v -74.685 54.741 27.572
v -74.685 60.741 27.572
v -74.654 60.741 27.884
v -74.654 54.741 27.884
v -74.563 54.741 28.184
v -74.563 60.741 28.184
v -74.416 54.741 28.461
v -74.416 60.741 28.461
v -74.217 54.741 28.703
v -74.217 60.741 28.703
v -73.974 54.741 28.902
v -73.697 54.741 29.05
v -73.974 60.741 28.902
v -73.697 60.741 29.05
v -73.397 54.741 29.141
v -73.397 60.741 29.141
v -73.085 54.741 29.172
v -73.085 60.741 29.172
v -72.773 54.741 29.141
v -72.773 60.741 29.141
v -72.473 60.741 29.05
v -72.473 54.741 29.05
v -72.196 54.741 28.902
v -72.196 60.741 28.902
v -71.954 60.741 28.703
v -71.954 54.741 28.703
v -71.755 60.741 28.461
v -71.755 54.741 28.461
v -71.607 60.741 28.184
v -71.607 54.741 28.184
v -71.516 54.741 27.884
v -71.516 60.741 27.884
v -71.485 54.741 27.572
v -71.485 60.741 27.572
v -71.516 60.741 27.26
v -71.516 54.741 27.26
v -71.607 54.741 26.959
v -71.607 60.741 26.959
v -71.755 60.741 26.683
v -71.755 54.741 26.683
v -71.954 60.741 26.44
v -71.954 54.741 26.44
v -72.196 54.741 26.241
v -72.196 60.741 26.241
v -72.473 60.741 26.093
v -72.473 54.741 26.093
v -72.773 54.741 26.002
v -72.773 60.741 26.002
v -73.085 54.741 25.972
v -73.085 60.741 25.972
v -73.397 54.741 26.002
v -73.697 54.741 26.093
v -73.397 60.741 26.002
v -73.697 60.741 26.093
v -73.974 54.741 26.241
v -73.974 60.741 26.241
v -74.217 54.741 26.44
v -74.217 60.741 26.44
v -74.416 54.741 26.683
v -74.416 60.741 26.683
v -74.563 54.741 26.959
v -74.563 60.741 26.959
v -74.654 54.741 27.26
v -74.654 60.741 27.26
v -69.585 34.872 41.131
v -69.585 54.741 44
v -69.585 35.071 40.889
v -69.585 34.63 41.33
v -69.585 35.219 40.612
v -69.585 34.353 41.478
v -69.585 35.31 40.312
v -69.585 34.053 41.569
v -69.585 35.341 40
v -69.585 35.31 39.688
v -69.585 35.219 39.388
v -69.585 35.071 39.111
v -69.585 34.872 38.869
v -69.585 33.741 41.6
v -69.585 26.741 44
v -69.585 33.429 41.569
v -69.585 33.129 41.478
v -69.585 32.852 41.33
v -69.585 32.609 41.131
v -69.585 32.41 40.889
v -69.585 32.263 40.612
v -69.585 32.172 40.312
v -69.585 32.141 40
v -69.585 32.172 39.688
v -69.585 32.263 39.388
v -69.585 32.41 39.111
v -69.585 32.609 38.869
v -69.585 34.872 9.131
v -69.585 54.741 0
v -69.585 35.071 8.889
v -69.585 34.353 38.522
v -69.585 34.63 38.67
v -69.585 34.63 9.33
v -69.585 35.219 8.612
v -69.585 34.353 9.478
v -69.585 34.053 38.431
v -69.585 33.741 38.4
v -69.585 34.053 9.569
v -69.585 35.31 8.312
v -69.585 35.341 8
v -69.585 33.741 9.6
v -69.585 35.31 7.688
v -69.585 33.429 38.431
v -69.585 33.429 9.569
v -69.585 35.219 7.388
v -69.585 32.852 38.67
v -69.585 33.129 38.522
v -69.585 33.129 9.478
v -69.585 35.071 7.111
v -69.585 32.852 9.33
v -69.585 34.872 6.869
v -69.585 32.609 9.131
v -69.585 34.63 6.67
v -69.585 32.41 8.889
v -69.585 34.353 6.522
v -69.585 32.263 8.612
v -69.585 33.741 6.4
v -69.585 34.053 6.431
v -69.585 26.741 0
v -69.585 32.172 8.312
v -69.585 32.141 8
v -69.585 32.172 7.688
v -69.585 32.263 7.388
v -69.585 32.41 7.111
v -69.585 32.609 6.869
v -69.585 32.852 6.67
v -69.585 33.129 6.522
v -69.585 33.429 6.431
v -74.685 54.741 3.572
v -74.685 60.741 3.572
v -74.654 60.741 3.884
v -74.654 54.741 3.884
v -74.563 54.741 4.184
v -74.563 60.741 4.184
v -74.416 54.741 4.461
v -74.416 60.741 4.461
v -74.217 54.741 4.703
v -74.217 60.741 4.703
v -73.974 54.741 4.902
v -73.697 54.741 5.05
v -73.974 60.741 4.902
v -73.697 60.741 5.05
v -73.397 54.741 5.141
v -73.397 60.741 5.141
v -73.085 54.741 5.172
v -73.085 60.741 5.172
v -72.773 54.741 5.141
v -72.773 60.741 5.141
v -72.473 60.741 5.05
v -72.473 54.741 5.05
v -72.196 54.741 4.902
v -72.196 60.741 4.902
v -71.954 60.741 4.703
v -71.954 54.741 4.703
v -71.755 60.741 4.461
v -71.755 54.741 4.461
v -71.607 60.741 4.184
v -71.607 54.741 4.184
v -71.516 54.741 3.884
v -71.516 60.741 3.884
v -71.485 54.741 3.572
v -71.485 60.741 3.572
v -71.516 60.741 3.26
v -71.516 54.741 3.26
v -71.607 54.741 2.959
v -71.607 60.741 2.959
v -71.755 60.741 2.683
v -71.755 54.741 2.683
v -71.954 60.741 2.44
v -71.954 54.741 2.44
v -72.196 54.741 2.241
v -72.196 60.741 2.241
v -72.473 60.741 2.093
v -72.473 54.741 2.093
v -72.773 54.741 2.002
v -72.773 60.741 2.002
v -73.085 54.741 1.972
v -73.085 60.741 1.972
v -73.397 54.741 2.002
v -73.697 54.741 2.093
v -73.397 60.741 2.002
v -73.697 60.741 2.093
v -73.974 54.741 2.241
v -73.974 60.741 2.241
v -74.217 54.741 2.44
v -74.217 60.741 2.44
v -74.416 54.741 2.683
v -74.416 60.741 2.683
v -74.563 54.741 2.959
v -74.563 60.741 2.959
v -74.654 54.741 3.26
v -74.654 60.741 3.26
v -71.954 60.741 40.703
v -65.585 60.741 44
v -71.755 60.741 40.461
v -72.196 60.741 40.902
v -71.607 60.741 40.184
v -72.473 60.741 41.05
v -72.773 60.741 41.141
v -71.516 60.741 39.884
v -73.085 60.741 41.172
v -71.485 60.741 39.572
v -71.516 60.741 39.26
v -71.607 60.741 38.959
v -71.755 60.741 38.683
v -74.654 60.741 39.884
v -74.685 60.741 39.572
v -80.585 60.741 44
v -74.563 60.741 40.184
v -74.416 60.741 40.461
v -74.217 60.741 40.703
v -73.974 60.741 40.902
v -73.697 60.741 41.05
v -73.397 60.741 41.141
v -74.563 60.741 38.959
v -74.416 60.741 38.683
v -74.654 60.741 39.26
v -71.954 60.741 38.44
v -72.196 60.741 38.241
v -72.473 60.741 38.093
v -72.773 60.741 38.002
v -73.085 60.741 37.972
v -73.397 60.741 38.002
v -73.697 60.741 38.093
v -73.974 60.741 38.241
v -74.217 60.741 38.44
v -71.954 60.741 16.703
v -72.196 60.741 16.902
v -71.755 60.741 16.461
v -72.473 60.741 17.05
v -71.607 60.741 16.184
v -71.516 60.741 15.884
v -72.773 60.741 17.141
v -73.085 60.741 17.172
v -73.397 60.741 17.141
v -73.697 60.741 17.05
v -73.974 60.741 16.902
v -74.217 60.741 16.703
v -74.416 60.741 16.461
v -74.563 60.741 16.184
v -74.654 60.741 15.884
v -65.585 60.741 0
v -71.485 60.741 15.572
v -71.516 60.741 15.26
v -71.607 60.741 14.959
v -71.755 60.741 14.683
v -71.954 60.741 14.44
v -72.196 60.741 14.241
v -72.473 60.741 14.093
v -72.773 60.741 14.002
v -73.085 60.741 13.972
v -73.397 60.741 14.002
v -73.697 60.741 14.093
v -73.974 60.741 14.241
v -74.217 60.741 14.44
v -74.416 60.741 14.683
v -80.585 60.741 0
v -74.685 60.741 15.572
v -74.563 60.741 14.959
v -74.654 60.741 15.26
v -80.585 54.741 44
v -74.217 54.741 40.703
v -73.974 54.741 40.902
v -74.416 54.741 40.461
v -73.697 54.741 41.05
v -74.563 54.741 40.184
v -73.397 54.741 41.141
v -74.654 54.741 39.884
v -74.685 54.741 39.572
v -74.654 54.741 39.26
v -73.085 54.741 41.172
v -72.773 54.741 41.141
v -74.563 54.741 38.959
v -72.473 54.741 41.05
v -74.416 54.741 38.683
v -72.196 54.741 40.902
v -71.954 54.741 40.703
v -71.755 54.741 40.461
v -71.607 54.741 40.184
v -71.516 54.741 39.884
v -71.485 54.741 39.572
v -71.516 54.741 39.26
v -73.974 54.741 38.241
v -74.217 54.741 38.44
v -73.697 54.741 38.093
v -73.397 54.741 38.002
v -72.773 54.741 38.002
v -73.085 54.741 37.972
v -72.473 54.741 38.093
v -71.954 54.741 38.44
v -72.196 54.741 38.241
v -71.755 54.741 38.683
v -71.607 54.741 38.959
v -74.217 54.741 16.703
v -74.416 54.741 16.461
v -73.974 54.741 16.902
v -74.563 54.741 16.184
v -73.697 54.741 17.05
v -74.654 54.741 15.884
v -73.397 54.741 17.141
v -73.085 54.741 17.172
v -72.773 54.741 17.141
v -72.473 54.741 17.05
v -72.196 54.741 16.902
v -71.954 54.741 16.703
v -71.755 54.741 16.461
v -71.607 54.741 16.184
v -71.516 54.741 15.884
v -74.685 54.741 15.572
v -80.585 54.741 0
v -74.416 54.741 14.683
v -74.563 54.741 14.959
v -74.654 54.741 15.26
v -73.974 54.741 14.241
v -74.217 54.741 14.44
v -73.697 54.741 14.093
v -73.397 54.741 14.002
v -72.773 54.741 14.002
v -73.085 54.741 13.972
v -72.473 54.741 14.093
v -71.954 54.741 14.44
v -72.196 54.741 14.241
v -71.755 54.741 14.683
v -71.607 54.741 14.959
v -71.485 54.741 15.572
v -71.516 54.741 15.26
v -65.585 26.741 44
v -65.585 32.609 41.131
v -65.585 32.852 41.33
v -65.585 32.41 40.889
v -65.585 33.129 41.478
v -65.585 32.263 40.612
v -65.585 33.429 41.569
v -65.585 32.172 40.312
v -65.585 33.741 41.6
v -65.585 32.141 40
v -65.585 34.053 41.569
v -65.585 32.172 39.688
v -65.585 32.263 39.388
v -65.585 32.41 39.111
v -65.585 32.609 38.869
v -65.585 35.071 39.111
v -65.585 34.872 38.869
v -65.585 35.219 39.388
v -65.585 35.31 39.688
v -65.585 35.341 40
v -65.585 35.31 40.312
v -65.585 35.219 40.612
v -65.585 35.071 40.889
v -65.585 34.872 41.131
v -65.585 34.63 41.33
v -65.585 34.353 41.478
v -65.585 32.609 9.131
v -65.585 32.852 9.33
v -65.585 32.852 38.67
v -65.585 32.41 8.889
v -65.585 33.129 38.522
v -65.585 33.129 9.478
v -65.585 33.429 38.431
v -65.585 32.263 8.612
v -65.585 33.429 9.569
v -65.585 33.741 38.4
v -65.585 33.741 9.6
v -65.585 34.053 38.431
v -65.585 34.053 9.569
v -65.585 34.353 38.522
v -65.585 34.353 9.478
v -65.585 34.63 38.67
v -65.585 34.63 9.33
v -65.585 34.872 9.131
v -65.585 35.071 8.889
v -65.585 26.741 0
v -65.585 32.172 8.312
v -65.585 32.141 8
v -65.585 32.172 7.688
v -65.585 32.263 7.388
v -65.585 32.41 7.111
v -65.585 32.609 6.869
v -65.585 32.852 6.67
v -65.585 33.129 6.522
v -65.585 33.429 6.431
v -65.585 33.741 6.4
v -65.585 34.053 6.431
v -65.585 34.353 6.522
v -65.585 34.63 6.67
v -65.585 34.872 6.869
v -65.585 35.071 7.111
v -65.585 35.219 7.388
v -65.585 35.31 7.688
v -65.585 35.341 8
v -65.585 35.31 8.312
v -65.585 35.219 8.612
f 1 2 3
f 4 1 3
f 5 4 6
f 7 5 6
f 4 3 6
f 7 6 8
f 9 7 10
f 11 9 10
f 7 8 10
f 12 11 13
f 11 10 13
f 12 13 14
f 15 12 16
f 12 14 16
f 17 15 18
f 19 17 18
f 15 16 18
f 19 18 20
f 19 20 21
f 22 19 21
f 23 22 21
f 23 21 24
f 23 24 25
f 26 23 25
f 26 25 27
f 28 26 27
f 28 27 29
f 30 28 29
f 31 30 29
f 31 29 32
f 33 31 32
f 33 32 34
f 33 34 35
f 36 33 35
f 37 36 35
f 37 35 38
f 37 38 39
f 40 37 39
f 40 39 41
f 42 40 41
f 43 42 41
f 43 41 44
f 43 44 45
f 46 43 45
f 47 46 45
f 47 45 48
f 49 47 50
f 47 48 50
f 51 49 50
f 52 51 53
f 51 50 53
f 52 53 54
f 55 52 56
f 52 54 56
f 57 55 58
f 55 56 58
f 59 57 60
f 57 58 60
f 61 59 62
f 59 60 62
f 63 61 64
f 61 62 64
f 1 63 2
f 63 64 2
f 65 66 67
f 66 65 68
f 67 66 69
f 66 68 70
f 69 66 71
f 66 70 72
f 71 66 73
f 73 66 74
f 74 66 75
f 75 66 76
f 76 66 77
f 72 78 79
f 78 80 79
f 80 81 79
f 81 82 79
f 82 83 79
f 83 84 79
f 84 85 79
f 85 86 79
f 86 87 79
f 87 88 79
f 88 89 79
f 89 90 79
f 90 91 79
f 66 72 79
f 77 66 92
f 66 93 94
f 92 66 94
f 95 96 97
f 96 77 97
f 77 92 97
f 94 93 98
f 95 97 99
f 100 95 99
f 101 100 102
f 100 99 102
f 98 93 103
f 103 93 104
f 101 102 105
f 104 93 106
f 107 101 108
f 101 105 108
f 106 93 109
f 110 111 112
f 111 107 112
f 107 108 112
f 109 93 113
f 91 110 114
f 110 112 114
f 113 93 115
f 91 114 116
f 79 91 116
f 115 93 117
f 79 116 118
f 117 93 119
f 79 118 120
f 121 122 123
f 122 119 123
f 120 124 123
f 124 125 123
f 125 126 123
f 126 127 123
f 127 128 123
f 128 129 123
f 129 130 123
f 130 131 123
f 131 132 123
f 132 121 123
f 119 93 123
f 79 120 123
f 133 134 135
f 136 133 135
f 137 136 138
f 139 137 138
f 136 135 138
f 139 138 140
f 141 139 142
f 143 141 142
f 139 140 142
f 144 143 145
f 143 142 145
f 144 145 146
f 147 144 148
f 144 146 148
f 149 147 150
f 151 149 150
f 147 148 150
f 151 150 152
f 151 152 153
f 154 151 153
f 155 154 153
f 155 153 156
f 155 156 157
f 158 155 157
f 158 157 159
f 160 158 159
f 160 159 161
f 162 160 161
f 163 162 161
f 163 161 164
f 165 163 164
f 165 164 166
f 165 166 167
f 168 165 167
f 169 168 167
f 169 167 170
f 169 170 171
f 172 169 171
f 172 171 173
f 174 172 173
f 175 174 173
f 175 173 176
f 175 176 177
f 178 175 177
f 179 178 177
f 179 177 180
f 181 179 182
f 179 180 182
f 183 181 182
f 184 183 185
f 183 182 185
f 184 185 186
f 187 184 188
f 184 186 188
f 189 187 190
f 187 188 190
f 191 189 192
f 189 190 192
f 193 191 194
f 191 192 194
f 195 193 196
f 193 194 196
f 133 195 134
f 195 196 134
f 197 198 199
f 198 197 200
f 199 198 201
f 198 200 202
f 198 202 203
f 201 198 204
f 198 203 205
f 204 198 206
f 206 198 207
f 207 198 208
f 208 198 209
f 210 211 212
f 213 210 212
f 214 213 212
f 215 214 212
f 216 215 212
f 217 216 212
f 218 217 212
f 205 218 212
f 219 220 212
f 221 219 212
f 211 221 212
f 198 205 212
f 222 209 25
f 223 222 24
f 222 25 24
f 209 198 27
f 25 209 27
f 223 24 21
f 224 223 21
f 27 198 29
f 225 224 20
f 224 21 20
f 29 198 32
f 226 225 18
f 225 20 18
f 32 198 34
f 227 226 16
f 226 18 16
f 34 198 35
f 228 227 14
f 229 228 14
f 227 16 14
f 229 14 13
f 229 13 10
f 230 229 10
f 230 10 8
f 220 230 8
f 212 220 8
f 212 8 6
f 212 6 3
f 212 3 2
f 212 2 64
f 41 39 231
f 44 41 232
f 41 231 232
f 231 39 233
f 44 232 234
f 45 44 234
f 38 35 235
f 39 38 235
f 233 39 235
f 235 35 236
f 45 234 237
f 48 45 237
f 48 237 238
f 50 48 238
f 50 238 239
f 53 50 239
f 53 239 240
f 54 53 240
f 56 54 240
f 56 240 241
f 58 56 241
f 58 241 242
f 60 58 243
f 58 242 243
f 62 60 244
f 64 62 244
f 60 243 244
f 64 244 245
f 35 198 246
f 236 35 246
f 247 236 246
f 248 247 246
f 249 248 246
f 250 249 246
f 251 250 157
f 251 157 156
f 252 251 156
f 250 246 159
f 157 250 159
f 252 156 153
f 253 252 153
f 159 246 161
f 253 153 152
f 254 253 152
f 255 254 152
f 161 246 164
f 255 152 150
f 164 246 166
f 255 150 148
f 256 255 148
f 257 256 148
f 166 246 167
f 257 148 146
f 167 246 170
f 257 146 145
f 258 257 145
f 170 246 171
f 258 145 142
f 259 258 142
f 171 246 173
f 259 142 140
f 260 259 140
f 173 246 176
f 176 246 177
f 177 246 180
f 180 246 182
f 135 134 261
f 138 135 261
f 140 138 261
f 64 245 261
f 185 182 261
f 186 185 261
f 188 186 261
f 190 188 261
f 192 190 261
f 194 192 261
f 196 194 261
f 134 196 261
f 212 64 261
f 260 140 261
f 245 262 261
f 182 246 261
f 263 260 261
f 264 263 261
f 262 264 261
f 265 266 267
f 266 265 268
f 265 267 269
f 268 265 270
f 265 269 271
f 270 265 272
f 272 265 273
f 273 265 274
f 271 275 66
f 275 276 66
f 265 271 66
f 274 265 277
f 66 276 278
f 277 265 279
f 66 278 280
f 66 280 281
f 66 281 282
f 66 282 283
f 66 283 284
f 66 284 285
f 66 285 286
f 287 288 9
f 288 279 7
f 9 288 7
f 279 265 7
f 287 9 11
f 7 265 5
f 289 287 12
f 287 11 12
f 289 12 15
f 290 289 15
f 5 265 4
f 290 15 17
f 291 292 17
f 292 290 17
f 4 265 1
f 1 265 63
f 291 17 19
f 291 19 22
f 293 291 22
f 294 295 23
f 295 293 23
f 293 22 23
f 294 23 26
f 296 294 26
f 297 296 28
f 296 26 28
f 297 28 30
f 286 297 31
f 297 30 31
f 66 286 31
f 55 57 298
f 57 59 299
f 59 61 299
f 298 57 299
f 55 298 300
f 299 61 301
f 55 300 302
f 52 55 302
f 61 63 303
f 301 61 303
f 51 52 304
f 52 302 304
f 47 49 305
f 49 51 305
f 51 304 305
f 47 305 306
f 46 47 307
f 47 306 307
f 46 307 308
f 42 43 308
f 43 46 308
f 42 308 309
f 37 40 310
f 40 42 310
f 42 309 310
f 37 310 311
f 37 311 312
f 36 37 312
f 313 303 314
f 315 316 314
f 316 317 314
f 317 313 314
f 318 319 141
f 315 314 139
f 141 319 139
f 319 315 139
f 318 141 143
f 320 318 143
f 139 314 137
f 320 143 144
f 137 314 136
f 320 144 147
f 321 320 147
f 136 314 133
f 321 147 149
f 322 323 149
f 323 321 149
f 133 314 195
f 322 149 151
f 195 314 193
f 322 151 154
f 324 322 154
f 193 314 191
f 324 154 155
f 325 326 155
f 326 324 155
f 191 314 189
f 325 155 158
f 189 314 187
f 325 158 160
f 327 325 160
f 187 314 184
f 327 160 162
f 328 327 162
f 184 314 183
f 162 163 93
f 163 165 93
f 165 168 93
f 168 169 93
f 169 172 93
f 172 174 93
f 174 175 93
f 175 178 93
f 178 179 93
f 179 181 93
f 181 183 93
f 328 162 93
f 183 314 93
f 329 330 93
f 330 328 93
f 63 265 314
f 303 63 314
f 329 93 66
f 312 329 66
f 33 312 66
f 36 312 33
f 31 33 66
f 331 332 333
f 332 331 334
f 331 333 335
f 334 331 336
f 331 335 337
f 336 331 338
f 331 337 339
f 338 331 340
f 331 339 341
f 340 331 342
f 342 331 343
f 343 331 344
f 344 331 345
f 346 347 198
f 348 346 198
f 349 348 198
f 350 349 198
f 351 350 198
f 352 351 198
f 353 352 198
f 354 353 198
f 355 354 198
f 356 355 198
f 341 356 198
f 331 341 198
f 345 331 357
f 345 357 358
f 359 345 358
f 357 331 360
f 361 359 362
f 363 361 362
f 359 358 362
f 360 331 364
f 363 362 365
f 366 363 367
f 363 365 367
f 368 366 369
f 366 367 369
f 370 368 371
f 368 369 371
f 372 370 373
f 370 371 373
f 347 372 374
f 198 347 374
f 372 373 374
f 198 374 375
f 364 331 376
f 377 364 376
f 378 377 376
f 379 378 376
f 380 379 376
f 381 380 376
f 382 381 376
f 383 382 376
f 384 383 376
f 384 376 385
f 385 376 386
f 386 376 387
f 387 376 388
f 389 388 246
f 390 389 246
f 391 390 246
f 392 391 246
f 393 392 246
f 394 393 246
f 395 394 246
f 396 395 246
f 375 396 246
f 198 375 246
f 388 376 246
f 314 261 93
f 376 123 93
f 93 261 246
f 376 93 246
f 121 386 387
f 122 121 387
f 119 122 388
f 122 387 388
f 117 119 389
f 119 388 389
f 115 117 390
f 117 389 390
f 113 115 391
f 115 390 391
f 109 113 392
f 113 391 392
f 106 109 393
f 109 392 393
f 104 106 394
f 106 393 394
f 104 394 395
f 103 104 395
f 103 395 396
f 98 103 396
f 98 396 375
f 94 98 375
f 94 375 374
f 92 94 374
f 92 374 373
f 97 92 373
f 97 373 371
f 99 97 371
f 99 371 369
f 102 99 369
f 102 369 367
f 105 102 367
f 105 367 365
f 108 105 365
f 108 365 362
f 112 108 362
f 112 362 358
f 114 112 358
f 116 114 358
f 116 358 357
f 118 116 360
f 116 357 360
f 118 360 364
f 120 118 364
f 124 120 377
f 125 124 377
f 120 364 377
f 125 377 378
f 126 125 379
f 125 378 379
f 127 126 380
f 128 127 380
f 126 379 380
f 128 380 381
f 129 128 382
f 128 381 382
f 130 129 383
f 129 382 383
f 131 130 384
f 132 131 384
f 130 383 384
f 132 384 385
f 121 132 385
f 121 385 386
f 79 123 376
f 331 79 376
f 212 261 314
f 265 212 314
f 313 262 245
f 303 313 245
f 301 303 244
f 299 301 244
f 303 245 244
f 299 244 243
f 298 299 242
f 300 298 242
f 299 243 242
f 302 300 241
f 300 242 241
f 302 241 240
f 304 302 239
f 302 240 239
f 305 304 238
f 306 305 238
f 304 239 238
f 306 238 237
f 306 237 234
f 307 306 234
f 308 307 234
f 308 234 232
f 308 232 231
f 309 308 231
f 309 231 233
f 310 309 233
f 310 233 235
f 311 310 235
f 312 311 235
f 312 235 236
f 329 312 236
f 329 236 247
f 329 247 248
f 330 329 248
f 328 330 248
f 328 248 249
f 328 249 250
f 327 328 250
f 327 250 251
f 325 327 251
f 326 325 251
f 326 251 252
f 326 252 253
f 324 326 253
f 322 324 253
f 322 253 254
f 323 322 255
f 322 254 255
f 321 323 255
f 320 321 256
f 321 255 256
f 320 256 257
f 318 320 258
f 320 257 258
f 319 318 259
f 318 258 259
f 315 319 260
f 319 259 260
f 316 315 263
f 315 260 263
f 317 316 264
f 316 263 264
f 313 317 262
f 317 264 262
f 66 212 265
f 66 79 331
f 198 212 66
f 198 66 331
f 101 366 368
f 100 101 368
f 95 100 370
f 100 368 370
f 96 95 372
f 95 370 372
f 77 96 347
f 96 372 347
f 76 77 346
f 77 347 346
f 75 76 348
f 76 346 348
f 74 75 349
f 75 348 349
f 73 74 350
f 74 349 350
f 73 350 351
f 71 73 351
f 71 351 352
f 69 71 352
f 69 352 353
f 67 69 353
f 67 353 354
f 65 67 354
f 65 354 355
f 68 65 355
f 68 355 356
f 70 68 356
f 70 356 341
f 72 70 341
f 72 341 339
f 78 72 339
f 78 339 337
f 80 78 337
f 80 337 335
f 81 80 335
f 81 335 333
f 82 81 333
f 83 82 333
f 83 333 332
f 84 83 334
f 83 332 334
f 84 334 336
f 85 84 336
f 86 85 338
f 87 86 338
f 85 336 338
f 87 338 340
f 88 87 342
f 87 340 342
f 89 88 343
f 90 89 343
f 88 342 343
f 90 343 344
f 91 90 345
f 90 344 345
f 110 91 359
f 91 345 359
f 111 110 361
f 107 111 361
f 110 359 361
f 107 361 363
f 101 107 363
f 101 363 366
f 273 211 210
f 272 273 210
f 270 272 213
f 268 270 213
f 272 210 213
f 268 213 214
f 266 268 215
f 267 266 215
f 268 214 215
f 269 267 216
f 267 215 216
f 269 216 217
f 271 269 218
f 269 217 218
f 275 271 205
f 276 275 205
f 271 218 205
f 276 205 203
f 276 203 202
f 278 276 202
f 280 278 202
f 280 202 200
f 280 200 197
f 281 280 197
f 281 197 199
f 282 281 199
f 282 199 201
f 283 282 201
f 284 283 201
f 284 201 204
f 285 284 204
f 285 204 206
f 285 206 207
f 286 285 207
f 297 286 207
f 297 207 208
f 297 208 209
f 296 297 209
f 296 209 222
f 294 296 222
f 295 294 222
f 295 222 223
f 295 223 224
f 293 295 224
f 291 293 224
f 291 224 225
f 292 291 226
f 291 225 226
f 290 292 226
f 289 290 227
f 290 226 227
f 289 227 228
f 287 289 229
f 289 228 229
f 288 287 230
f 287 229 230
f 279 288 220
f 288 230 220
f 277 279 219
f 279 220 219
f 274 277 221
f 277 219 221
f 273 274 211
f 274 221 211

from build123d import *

# Parameters (mm, degrees)
BOSS_EXTRUDE1_DEPTH = 44
SKETCH3_R           = 1.6
CUT_EXTRUDE2_DEPTH  = 10
SKETCH2_R           = 1.6
CUT_EXTRUDE3_DEPTH  = 10


with BuildPart() as part:
    # Sketch1 → Boss-Extrude1 (new body)
    with BuildSketch(Plane.XY):
        Polygon((-80.585156419, 60.740798274), (-80.585156419, 54.740798274), (-69.585156419, 54.740798274), (-69.585156419, 26.740798274), (-65.585156419, 26.740798274), (-65.585156419, 60.740798274), align=None)
    extrude(amount=BOSS_EXTRUDE1_DEPTH)

    # Sketch3 → Cut-Extrude2 (cut)
    with BuildSketch(Plane(origin=(-65.585156419, 0, 0), x_dir=(0, 0, -1), z_dir=(1, 0, 0))):
        with Locations((-40, 33.740798274)):
            Circle(SKETCH3_R)
        with Locations((-8, 33.740798274)):
            Circle(SKETCH3_R)
    extrude(amount=-CUT_EXTRUDE2_DEPTH, mode=Mode.SUBTRACT)

    # Sketch2 → Cut-Extrude3 (cut)
    with BuildSketch(Plane(origin=(0, 60.740798274, 0), x_dir=(1, 0, 0), z_dir=(0, 1, 0))):
        with Locations(Location((-73.085156419, -3.571673595, 0), (0, 0, 180))):
            Circle(SKETCH2_R)
        with Locations(Location((-73.085156419, -15.571673595, 0), (0, 0, 180))):
            Circle(SKETCH2_R)
        with Locations(Location((-73.085156419, -27.571673595, 0), (0, 0, 180))):
            Circle(SKETCH2_R)
        with Locations(Location((-73.085156419, -39.571673595, 0), (0, 0, 180))):
            Circle(SKETCH2_R)
    extrude(amount=-CUT_EXTRUDE3_DEPTH, mode=Mode.SUBTRACT)


solid = part.part
